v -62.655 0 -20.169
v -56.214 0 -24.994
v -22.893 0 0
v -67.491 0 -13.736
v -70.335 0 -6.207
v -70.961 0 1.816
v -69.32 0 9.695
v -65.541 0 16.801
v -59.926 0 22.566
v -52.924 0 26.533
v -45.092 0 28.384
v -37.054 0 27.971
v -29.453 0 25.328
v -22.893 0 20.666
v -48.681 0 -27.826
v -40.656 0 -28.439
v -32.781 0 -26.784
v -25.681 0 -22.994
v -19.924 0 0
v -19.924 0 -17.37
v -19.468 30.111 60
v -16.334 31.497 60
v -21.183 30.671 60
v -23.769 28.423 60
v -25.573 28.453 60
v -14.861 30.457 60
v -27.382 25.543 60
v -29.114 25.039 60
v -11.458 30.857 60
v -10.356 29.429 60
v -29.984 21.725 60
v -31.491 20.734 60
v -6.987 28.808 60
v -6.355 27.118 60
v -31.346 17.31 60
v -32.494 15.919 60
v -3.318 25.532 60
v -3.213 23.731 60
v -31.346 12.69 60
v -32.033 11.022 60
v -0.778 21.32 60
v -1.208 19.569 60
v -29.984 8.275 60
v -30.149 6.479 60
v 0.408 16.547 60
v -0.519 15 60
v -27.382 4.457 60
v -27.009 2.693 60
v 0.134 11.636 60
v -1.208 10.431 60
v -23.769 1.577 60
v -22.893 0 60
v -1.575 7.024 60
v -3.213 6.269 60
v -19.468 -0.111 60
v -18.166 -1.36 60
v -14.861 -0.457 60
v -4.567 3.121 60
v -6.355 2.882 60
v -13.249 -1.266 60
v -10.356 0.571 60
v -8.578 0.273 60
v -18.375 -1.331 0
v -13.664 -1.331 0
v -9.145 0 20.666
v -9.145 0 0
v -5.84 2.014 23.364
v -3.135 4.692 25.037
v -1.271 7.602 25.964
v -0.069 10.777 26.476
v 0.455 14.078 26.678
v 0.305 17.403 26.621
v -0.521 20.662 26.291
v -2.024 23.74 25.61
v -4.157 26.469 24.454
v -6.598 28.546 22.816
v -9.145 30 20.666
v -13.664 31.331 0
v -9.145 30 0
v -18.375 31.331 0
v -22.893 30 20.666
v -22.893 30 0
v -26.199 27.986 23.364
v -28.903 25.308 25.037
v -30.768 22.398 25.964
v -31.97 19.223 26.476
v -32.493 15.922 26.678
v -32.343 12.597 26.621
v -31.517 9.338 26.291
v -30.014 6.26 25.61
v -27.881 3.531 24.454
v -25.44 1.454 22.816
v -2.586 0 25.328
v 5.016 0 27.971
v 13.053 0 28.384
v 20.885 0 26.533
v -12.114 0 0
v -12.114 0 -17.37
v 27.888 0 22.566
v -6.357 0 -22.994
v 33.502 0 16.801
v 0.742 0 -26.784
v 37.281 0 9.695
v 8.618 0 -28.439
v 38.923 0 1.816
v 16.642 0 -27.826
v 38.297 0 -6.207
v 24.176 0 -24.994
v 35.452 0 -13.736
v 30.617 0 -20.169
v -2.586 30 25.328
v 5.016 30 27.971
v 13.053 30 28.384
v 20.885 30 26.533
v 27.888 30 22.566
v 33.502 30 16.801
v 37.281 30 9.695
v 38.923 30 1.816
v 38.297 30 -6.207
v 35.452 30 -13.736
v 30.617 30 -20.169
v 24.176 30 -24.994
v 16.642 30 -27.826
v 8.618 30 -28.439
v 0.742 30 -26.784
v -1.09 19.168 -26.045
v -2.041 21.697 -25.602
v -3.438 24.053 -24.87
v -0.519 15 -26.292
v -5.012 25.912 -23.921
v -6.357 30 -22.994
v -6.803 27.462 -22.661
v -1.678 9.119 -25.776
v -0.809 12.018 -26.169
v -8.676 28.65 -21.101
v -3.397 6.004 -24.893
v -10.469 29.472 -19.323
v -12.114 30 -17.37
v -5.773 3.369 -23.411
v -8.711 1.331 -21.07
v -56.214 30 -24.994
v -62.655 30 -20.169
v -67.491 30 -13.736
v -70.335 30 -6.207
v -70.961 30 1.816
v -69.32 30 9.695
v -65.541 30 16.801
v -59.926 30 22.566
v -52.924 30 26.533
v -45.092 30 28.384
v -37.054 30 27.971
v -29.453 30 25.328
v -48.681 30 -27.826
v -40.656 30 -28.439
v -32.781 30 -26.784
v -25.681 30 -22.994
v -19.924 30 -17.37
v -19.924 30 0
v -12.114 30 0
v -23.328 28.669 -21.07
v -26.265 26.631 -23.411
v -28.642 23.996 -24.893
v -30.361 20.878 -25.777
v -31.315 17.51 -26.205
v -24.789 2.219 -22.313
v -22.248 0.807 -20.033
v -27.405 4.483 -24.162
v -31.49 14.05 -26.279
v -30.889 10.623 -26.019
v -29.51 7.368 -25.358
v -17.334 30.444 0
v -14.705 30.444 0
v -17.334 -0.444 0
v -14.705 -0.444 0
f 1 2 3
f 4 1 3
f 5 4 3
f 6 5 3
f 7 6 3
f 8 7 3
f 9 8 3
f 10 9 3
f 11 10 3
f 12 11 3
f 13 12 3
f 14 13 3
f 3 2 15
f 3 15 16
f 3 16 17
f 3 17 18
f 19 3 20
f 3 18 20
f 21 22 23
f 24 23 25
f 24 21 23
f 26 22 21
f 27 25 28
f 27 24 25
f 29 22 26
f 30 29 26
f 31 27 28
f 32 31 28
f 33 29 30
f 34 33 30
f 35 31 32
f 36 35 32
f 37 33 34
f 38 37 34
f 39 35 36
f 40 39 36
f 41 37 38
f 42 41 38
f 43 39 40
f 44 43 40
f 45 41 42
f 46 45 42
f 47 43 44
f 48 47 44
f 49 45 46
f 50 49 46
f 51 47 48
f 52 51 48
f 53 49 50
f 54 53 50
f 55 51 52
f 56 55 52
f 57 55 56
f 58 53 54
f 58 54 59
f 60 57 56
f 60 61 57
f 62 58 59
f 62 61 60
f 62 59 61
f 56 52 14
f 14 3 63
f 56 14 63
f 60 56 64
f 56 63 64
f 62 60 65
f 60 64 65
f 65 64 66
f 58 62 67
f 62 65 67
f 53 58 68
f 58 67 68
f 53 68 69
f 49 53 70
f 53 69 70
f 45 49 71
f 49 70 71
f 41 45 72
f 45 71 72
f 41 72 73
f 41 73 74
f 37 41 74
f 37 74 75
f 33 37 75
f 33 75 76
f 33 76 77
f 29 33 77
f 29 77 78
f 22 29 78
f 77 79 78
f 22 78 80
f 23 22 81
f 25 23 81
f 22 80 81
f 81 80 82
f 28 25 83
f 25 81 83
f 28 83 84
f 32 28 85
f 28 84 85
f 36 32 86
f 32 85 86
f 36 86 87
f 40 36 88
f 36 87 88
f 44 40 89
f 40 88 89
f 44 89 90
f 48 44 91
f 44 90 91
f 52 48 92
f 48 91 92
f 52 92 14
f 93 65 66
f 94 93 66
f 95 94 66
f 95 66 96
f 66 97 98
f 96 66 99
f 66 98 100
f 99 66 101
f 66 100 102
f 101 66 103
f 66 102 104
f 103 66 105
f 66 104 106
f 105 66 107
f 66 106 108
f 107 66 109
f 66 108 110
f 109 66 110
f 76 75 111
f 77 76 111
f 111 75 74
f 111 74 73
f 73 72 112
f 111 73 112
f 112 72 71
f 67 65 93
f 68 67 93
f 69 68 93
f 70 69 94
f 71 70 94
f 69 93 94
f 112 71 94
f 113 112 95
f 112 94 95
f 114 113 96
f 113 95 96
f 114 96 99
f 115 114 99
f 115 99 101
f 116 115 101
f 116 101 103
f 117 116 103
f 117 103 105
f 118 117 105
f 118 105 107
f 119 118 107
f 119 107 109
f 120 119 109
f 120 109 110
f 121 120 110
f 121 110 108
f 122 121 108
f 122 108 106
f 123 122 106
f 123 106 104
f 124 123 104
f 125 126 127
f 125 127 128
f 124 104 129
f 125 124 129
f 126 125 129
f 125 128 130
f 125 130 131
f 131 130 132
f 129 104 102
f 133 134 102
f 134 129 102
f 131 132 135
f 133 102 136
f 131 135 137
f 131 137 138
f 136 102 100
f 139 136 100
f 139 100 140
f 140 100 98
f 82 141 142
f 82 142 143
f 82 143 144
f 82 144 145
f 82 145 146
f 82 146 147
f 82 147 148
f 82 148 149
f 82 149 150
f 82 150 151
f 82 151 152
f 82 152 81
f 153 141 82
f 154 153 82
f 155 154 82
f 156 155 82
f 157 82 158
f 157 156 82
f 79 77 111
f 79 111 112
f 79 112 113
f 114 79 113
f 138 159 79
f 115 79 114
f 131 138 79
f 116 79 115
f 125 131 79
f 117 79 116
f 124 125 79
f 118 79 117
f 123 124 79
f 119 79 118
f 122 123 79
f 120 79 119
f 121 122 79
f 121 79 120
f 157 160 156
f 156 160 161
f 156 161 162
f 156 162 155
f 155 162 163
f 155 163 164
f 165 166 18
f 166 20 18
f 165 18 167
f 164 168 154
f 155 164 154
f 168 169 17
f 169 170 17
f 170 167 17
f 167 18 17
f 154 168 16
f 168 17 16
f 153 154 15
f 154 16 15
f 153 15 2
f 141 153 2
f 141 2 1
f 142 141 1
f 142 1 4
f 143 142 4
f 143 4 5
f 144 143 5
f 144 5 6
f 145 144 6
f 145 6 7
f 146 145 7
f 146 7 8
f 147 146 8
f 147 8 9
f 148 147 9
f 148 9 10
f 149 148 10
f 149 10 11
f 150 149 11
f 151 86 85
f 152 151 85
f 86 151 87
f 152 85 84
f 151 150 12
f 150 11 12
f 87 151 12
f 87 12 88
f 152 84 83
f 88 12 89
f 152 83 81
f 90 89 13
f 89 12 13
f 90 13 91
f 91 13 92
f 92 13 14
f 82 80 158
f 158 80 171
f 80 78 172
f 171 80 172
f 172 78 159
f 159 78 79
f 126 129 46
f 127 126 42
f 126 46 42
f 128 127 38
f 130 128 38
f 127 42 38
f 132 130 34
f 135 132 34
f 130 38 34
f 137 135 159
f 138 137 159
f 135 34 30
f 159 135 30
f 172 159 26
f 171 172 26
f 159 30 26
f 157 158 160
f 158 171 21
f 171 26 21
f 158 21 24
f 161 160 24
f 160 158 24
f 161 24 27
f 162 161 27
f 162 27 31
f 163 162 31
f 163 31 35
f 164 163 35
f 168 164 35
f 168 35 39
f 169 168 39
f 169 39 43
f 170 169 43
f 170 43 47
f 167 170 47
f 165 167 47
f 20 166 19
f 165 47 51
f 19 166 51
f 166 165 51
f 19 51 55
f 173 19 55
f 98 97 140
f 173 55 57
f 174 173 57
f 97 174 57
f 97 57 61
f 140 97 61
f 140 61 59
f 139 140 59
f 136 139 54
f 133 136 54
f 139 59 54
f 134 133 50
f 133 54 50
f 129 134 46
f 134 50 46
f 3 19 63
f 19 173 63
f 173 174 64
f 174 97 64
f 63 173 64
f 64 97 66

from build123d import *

# Parameters (mm, degrees)
BOSS_EXTRUDE1_DEPTH = 30
SKETCH2_R           = 16.5
BOSS_EXTRUDE2_DEPTH = 60
SKETCH3_R           = 15.5
CUT_EXTRUDE1_DEPTH  = 118.763469435


with BuildPart() as part:
    # Sketch1 → Boss-Extrude1 (new body)
    with BuildSketch(Plane(origin=(0, 0, 0), x_dir=(1, 0, 0), z_dir=(0, 1, 0))):
        with BuildLine():
            ThreePointArc((-16.019255805, 10.488088482), (-71.019255805, 0), (-16.019255805, -10.488088482))
            ThreePointArc((-16.019255805, -10.488088482), (38.980744195, 0), (-16.019255805, 10.488088482))
        make_face()
    extrude(amount=BOSS_EXTRUDE1_DEPTH)

    # Sketch2 → Boss-Extrude2 (add)
    with BuildSketch(Plane.XY):
        with Locations(Location((-16.019255805, 15, 0), (0, 0, 245.380016324))):
            Circle(SKETCH2_R)
    extrude(amount=BOSS_EXTRUDE2_DEPTH)

    # Sketch3 → Cut-Extrude1 (cut, through all)
    with BuildSketch(Plane.XY.offset(60)):
        with Locations((-16.019255805, 15)):
            Circle(SKETCH3_R)
    extrude(amount=-CUT_EXTRUDE1_DEPTH, mode=Mode.SUBTRACT)


solid = part.part
